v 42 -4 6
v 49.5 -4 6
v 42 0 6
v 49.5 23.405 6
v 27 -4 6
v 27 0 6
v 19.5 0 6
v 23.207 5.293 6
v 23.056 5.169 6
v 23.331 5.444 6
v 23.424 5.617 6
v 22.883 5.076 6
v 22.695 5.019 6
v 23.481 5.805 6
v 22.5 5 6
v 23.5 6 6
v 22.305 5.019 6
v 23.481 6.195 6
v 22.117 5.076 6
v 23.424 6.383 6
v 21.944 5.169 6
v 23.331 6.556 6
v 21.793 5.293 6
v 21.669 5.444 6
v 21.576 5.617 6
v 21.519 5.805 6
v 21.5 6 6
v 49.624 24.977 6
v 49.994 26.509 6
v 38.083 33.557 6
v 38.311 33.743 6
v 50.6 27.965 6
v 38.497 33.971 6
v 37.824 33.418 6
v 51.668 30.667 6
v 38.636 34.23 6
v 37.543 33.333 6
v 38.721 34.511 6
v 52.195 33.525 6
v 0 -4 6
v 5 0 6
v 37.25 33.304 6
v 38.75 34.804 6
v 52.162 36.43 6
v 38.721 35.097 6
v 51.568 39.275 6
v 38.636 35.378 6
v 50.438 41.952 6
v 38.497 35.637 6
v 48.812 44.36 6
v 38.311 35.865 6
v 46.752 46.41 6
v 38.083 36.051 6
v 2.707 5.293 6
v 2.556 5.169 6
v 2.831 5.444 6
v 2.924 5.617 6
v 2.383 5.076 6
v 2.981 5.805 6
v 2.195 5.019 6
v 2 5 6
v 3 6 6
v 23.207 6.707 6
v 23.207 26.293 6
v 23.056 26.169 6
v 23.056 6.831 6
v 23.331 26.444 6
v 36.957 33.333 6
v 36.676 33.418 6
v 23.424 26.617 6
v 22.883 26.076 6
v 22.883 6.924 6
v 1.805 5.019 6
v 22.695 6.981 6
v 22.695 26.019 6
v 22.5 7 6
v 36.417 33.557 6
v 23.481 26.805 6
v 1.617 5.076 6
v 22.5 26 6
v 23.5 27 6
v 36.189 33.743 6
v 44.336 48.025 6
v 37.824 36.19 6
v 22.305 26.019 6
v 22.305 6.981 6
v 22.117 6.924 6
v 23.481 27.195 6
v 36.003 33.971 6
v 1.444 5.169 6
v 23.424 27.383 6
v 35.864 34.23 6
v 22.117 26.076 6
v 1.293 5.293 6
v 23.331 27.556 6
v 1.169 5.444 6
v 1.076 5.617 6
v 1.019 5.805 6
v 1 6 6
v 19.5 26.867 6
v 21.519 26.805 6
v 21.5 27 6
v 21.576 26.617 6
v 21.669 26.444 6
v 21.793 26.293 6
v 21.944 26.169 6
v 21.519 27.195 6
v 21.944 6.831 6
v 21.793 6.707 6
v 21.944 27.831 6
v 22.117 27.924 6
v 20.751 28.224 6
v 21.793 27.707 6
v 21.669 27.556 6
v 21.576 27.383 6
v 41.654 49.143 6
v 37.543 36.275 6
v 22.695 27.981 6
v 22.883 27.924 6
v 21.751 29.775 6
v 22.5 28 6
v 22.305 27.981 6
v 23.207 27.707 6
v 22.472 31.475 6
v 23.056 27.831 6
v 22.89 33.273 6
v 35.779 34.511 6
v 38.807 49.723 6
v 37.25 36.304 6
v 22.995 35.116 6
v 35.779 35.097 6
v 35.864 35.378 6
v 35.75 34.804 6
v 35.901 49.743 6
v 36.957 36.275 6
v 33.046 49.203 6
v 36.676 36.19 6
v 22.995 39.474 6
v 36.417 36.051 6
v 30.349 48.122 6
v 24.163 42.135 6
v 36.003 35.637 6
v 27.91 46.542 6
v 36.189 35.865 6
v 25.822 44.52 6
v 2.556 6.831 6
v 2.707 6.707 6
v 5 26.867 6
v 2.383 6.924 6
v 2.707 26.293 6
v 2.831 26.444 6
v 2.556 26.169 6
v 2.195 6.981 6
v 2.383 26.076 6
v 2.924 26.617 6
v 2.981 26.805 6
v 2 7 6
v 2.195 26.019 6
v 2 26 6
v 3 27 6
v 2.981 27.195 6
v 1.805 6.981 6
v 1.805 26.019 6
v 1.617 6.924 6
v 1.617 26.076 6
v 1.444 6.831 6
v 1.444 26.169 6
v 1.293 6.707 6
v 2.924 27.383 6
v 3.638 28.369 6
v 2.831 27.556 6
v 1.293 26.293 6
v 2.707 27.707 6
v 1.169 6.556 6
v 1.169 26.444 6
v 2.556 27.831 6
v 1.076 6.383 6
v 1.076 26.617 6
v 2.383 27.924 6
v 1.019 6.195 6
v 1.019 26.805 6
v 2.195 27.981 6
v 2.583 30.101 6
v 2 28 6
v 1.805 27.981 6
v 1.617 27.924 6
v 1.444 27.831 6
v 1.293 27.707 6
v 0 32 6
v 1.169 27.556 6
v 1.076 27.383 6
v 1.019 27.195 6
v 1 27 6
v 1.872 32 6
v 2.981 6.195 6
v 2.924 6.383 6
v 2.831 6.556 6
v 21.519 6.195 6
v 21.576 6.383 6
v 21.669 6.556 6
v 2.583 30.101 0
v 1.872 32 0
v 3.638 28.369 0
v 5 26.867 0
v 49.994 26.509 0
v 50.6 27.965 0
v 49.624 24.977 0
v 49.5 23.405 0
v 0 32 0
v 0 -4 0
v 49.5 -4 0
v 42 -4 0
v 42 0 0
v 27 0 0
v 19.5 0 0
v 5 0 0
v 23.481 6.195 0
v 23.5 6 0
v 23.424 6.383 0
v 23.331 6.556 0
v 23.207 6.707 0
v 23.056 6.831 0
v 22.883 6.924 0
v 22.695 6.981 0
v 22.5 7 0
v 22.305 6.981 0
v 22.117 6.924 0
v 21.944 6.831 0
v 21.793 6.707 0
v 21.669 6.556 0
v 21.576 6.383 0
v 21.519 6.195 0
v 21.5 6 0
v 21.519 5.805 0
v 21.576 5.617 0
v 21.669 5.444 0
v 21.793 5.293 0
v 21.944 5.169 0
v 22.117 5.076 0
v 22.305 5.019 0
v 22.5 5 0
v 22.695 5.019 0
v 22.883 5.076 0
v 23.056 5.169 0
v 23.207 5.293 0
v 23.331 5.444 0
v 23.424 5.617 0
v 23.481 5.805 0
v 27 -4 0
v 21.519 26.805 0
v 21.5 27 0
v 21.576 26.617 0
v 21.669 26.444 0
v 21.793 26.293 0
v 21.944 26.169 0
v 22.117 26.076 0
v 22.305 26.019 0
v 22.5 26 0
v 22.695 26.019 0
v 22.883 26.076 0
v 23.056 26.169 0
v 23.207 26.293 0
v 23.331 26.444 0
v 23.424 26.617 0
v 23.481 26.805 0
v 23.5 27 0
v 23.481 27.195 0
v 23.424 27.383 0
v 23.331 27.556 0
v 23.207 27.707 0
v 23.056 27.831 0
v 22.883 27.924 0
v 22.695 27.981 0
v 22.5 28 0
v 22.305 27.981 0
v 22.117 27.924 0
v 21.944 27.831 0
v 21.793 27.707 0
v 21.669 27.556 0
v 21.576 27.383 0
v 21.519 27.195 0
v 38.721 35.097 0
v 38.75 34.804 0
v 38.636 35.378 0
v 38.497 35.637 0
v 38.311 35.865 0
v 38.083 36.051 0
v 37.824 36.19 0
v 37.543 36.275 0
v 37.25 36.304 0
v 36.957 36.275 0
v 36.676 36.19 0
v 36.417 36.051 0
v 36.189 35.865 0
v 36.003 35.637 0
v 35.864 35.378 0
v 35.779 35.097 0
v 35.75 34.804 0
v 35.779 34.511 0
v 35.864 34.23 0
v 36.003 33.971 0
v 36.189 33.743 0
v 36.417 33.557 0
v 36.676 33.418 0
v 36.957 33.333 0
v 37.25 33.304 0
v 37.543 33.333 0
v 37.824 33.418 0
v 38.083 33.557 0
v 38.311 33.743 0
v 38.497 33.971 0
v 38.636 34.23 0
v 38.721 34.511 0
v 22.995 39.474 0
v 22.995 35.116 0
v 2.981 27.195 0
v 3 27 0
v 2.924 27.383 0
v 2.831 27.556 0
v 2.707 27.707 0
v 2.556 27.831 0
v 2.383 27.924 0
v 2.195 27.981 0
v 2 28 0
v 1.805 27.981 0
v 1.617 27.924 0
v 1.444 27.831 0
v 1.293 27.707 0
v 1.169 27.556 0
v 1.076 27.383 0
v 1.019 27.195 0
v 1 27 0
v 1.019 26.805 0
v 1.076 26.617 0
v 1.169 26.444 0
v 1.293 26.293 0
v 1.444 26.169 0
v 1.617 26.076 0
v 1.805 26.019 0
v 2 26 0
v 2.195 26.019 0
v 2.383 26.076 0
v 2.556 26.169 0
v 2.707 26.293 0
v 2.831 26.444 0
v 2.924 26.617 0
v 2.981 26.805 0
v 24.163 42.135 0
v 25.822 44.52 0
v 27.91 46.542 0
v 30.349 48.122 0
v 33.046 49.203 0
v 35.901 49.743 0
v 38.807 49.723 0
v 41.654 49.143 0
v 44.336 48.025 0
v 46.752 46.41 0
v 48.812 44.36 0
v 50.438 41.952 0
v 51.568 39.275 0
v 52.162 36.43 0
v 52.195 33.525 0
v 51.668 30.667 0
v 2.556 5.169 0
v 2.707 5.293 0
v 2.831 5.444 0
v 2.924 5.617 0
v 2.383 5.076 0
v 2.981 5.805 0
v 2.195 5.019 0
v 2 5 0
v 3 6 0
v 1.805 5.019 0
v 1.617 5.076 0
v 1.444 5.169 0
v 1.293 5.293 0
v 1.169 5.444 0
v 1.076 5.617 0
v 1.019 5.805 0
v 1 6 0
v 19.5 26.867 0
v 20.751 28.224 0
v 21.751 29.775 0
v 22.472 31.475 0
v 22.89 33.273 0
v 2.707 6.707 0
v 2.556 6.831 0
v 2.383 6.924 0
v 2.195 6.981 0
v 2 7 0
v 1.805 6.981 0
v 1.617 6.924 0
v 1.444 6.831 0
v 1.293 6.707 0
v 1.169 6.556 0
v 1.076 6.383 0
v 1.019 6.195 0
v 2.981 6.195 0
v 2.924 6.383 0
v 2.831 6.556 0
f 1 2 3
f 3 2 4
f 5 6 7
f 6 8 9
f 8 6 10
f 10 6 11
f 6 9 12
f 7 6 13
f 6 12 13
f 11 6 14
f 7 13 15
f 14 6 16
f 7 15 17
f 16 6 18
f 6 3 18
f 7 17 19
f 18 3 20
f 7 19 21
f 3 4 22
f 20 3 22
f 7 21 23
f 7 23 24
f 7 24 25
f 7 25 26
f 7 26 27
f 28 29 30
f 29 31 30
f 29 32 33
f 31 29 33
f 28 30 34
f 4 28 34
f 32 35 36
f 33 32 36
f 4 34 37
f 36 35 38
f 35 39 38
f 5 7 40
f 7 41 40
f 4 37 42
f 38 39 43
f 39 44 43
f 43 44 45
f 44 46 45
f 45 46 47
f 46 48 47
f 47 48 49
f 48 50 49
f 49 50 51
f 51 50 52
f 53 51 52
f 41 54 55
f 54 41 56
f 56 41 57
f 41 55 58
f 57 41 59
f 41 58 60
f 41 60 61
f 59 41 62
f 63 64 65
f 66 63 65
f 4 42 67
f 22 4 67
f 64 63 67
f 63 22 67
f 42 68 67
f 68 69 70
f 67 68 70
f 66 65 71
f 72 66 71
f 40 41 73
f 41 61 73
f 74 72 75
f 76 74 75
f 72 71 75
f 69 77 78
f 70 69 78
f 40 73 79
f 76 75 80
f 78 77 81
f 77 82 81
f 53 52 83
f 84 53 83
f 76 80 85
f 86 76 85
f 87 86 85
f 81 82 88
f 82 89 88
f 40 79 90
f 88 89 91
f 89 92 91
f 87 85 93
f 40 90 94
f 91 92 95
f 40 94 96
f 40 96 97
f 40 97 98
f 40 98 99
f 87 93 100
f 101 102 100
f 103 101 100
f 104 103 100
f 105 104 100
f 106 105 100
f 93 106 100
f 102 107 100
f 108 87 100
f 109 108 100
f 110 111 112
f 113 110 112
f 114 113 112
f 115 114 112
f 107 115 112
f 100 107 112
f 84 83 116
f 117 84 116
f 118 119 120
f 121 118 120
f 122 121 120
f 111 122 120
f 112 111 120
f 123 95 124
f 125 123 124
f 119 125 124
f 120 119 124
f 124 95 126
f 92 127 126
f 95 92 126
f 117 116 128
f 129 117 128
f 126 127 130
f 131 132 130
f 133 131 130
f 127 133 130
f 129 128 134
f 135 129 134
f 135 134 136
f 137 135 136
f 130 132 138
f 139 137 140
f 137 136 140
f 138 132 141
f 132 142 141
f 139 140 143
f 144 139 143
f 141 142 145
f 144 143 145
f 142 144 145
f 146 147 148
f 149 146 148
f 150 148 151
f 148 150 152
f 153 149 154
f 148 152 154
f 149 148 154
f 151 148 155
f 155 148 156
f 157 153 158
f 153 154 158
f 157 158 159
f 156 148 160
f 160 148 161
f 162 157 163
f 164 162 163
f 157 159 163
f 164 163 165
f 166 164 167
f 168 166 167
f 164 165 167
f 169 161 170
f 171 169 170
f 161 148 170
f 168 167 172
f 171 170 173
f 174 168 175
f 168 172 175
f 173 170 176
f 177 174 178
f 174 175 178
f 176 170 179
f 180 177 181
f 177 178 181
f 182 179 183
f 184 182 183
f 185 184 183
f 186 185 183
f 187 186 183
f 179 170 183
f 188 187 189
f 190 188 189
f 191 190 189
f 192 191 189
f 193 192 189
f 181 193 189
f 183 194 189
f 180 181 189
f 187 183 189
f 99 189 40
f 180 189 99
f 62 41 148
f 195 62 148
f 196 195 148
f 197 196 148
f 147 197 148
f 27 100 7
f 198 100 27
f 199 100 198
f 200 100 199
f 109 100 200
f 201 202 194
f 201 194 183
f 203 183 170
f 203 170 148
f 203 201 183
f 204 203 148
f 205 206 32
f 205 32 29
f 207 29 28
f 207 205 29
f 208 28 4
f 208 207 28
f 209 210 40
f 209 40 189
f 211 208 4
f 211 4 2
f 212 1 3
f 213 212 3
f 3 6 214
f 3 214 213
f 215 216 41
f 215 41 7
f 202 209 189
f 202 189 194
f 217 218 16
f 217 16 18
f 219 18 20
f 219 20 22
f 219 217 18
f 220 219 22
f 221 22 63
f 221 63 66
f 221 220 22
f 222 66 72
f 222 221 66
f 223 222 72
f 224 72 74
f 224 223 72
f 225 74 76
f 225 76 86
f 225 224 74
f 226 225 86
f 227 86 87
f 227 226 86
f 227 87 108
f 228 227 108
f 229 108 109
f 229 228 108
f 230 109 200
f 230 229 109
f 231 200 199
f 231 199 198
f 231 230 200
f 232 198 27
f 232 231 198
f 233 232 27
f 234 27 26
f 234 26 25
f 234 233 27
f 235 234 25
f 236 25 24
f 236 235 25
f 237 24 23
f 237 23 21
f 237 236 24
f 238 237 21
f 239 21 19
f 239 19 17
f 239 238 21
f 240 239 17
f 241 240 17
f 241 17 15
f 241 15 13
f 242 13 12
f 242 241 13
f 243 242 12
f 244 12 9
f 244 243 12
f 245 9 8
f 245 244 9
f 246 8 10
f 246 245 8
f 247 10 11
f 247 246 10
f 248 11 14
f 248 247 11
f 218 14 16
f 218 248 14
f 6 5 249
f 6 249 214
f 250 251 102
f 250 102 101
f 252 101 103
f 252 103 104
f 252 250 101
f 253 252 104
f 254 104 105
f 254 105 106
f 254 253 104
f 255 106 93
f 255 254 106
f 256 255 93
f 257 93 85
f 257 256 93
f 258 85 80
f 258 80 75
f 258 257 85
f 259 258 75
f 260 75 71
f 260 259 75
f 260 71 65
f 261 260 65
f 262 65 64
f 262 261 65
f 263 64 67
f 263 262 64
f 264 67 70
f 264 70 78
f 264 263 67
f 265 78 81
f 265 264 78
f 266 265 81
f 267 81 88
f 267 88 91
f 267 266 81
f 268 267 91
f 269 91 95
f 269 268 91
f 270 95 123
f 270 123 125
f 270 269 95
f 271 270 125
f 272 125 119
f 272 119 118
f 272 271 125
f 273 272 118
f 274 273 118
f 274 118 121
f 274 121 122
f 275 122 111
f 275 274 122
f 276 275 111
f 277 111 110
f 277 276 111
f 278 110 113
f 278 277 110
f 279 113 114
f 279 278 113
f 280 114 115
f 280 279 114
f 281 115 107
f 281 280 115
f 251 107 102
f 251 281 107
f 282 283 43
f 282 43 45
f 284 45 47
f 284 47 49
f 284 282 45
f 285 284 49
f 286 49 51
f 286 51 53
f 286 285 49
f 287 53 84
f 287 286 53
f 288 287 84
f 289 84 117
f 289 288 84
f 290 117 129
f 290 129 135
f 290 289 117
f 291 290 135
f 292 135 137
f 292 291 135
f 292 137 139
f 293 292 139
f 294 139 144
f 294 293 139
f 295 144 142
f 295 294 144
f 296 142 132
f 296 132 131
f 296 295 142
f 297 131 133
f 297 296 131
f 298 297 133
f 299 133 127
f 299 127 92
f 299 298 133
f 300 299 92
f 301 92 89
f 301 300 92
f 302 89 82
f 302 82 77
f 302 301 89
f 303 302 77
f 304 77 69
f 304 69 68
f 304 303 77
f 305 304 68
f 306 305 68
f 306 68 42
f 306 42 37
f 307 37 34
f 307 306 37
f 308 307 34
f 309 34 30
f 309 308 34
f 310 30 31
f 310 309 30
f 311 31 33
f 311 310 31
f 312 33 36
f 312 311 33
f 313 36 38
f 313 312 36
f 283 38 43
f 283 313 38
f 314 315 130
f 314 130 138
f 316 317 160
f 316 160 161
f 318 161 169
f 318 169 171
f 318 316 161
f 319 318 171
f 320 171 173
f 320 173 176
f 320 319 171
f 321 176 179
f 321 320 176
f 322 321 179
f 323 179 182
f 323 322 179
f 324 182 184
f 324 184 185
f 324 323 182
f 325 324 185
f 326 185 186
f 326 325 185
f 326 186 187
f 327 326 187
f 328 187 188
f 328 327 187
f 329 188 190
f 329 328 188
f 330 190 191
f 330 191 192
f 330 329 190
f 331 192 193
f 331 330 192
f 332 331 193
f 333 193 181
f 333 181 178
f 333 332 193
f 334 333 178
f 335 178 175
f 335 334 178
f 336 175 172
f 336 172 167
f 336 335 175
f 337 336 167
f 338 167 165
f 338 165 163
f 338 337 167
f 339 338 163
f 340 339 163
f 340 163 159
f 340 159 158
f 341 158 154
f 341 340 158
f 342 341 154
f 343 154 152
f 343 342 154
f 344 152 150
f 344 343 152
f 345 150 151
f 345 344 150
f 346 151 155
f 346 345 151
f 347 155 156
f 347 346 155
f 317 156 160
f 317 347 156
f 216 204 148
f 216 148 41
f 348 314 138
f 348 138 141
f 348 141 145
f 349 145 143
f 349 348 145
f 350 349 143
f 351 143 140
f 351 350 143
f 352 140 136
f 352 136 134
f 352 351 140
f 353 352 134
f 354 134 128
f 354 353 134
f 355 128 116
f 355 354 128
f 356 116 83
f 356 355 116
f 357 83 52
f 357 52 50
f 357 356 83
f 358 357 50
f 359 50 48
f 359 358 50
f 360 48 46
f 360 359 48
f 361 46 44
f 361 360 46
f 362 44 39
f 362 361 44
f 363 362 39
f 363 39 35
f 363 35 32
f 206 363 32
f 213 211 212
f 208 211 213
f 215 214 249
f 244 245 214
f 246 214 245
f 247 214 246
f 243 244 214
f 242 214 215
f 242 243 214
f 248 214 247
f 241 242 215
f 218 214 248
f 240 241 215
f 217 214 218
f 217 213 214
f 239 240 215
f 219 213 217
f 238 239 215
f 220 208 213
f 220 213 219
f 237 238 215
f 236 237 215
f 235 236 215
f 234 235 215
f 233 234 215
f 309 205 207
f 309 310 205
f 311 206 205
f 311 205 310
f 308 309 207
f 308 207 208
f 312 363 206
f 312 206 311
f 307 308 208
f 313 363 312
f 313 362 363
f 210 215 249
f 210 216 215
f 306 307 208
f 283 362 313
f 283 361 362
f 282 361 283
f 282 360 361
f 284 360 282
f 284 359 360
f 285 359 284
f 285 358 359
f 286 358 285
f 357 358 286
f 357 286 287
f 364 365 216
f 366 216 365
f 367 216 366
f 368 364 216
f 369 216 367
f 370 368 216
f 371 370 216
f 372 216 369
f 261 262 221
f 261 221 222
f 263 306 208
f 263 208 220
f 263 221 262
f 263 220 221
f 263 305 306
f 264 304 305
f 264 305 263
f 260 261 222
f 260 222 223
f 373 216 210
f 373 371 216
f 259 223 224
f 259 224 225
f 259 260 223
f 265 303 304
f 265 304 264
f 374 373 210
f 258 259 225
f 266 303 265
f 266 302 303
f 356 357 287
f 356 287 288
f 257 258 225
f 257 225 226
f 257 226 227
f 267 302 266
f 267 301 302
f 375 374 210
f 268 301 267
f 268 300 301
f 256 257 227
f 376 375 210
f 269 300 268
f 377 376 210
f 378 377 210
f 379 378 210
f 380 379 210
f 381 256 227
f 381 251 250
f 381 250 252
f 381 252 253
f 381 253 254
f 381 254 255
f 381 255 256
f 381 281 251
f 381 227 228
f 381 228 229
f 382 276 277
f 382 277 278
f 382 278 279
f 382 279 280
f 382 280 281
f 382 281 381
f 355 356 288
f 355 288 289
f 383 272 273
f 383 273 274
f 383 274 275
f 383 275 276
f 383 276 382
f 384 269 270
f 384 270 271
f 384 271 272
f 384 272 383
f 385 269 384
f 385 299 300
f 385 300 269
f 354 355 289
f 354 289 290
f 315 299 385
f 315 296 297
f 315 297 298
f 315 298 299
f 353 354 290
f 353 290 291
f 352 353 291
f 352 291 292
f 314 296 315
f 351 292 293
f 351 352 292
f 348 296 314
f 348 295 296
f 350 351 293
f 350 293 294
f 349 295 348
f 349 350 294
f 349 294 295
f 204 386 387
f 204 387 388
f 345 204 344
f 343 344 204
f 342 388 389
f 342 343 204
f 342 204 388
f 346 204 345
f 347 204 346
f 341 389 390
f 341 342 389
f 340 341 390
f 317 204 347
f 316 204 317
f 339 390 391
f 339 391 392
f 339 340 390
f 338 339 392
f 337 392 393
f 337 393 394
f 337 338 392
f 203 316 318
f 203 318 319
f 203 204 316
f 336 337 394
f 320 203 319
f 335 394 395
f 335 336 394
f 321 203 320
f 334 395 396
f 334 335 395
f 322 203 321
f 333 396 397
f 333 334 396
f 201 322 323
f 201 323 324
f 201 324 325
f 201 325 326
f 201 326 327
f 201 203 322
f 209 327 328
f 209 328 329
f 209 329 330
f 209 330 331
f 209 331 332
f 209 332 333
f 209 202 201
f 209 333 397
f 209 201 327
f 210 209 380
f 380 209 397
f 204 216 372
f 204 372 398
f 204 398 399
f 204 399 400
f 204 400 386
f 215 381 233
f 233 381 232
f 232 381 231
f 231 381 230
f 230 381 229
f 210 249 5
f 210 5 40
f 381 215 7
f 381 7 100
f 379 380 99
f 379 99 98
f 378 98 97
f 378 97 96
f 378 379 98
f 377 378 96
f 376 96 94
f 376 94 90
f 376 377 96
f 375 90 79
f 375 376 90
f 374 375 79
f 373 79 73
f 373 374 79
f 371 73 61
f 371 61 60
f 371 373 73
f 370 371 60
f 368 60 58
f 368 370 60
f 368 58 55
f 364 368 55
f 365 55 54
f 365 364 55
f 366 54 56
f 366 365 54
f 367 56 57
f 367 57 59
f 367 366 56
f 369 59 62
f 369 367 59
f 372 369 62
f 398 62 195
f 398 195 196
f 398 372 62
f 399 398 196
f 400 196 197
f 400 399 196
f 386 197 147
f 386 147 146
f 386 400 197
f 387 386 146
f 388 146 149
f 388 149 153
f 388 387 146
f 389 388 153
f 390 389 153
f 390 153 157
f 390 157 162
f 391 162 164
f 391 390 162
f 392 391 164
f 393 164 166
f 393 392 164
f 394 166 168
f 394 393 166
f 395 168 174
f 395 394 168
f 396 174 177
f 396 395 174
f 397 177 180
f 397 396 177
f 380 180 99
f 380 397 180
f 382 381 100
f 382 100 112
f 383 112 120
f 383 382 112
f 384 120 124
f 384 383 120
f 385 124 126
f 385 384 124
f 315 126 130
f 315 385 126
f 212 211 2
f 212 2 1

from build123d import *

# Parameters (mm, degrees)
SKETCH_1_R          = 1
SKETCH_1_R_2        = 1.5
EXTRUDE_1_DEPTH     = 6
SKETCH_3_W          = 15
SKETCH_3_H          = 4
CUT_EXTRUDE_1_DEPTH = 10


with BuildPart() as part:
    # Эскиз1 → Бобышка-Вытянуть1 (new body)
    with BuildSketch(Plane.XY):
        with BuildLine():
            Line((0, 0), (0, 32))
            Line((0, 32), (1.872137409, 32))
            ThreePointArc((1.872137409, 32), (3.069970858, 29.210301659), (5, 26.866755347))
            Line((5, 26.866755347), (5, 0))
            Line((5, 0), (19.5, 0))
            Line((19.5, 0), (19.5, 26.866755347))
            ThreePointArc((19.5, 26.866755347), (22.14801609, 30.609753984), (22.995479479, 35.115731548))
            Line((22.995479479, 35.115731548), (22.995479479, 39.473981947))
            ThreePointArc((22.995479479, 39.473981947), (43.022434445, 48.648827827), (50.6, 27.964601411))
            ThreePointArc((50.6, 27.964601411), (49.778888952, 25.750204045), (49.5, 23.404996165))
            Line((49.5, 23.404996165), (49.5, -4))
            Line((49.5, -4), (0, -4))
            Line((0, -4), (0, 0))
        make_face()
        with Locations((2, 27)):
            Circle(SKETCH_1_R, mode=Mode.SUBTRACT)
        with Locations(Location((22.5, 27, 0), (0, 0, 180))):
            Circle(SKETCH_1_R, mode=Mode.SUBTRACT)
        with Locations((22.5, 6)):
            Circle(SKETCH_1_R, mode=Mode.SUBTRACT)
        with Locations(Location((2, 6, 0), (0, 0, 180))):
            Circle(SKETCH_1_R, mode=Mode.SUBTRACT)
        with Locations((37.25, 34.80400928)):
            Circle(SKETCH_1_R_2, mode=Mode.SUBTRACT)
    extrude(amount=EXTRUDE_1_DEPTH)

    # Эскиз3 → Вырез-Вытянуть1 (cut)
    with BuildSketch(Plane.XY.offset(6)):
        with Locations((34.5, -2)):
            Rectangle(SKETCH_3_W, SKETCH_3_H)
    extrude(amount=-CUT_EXTRUDE_1_DEPTH, mode=Mode.SUBTRACT)


solid = part.part
